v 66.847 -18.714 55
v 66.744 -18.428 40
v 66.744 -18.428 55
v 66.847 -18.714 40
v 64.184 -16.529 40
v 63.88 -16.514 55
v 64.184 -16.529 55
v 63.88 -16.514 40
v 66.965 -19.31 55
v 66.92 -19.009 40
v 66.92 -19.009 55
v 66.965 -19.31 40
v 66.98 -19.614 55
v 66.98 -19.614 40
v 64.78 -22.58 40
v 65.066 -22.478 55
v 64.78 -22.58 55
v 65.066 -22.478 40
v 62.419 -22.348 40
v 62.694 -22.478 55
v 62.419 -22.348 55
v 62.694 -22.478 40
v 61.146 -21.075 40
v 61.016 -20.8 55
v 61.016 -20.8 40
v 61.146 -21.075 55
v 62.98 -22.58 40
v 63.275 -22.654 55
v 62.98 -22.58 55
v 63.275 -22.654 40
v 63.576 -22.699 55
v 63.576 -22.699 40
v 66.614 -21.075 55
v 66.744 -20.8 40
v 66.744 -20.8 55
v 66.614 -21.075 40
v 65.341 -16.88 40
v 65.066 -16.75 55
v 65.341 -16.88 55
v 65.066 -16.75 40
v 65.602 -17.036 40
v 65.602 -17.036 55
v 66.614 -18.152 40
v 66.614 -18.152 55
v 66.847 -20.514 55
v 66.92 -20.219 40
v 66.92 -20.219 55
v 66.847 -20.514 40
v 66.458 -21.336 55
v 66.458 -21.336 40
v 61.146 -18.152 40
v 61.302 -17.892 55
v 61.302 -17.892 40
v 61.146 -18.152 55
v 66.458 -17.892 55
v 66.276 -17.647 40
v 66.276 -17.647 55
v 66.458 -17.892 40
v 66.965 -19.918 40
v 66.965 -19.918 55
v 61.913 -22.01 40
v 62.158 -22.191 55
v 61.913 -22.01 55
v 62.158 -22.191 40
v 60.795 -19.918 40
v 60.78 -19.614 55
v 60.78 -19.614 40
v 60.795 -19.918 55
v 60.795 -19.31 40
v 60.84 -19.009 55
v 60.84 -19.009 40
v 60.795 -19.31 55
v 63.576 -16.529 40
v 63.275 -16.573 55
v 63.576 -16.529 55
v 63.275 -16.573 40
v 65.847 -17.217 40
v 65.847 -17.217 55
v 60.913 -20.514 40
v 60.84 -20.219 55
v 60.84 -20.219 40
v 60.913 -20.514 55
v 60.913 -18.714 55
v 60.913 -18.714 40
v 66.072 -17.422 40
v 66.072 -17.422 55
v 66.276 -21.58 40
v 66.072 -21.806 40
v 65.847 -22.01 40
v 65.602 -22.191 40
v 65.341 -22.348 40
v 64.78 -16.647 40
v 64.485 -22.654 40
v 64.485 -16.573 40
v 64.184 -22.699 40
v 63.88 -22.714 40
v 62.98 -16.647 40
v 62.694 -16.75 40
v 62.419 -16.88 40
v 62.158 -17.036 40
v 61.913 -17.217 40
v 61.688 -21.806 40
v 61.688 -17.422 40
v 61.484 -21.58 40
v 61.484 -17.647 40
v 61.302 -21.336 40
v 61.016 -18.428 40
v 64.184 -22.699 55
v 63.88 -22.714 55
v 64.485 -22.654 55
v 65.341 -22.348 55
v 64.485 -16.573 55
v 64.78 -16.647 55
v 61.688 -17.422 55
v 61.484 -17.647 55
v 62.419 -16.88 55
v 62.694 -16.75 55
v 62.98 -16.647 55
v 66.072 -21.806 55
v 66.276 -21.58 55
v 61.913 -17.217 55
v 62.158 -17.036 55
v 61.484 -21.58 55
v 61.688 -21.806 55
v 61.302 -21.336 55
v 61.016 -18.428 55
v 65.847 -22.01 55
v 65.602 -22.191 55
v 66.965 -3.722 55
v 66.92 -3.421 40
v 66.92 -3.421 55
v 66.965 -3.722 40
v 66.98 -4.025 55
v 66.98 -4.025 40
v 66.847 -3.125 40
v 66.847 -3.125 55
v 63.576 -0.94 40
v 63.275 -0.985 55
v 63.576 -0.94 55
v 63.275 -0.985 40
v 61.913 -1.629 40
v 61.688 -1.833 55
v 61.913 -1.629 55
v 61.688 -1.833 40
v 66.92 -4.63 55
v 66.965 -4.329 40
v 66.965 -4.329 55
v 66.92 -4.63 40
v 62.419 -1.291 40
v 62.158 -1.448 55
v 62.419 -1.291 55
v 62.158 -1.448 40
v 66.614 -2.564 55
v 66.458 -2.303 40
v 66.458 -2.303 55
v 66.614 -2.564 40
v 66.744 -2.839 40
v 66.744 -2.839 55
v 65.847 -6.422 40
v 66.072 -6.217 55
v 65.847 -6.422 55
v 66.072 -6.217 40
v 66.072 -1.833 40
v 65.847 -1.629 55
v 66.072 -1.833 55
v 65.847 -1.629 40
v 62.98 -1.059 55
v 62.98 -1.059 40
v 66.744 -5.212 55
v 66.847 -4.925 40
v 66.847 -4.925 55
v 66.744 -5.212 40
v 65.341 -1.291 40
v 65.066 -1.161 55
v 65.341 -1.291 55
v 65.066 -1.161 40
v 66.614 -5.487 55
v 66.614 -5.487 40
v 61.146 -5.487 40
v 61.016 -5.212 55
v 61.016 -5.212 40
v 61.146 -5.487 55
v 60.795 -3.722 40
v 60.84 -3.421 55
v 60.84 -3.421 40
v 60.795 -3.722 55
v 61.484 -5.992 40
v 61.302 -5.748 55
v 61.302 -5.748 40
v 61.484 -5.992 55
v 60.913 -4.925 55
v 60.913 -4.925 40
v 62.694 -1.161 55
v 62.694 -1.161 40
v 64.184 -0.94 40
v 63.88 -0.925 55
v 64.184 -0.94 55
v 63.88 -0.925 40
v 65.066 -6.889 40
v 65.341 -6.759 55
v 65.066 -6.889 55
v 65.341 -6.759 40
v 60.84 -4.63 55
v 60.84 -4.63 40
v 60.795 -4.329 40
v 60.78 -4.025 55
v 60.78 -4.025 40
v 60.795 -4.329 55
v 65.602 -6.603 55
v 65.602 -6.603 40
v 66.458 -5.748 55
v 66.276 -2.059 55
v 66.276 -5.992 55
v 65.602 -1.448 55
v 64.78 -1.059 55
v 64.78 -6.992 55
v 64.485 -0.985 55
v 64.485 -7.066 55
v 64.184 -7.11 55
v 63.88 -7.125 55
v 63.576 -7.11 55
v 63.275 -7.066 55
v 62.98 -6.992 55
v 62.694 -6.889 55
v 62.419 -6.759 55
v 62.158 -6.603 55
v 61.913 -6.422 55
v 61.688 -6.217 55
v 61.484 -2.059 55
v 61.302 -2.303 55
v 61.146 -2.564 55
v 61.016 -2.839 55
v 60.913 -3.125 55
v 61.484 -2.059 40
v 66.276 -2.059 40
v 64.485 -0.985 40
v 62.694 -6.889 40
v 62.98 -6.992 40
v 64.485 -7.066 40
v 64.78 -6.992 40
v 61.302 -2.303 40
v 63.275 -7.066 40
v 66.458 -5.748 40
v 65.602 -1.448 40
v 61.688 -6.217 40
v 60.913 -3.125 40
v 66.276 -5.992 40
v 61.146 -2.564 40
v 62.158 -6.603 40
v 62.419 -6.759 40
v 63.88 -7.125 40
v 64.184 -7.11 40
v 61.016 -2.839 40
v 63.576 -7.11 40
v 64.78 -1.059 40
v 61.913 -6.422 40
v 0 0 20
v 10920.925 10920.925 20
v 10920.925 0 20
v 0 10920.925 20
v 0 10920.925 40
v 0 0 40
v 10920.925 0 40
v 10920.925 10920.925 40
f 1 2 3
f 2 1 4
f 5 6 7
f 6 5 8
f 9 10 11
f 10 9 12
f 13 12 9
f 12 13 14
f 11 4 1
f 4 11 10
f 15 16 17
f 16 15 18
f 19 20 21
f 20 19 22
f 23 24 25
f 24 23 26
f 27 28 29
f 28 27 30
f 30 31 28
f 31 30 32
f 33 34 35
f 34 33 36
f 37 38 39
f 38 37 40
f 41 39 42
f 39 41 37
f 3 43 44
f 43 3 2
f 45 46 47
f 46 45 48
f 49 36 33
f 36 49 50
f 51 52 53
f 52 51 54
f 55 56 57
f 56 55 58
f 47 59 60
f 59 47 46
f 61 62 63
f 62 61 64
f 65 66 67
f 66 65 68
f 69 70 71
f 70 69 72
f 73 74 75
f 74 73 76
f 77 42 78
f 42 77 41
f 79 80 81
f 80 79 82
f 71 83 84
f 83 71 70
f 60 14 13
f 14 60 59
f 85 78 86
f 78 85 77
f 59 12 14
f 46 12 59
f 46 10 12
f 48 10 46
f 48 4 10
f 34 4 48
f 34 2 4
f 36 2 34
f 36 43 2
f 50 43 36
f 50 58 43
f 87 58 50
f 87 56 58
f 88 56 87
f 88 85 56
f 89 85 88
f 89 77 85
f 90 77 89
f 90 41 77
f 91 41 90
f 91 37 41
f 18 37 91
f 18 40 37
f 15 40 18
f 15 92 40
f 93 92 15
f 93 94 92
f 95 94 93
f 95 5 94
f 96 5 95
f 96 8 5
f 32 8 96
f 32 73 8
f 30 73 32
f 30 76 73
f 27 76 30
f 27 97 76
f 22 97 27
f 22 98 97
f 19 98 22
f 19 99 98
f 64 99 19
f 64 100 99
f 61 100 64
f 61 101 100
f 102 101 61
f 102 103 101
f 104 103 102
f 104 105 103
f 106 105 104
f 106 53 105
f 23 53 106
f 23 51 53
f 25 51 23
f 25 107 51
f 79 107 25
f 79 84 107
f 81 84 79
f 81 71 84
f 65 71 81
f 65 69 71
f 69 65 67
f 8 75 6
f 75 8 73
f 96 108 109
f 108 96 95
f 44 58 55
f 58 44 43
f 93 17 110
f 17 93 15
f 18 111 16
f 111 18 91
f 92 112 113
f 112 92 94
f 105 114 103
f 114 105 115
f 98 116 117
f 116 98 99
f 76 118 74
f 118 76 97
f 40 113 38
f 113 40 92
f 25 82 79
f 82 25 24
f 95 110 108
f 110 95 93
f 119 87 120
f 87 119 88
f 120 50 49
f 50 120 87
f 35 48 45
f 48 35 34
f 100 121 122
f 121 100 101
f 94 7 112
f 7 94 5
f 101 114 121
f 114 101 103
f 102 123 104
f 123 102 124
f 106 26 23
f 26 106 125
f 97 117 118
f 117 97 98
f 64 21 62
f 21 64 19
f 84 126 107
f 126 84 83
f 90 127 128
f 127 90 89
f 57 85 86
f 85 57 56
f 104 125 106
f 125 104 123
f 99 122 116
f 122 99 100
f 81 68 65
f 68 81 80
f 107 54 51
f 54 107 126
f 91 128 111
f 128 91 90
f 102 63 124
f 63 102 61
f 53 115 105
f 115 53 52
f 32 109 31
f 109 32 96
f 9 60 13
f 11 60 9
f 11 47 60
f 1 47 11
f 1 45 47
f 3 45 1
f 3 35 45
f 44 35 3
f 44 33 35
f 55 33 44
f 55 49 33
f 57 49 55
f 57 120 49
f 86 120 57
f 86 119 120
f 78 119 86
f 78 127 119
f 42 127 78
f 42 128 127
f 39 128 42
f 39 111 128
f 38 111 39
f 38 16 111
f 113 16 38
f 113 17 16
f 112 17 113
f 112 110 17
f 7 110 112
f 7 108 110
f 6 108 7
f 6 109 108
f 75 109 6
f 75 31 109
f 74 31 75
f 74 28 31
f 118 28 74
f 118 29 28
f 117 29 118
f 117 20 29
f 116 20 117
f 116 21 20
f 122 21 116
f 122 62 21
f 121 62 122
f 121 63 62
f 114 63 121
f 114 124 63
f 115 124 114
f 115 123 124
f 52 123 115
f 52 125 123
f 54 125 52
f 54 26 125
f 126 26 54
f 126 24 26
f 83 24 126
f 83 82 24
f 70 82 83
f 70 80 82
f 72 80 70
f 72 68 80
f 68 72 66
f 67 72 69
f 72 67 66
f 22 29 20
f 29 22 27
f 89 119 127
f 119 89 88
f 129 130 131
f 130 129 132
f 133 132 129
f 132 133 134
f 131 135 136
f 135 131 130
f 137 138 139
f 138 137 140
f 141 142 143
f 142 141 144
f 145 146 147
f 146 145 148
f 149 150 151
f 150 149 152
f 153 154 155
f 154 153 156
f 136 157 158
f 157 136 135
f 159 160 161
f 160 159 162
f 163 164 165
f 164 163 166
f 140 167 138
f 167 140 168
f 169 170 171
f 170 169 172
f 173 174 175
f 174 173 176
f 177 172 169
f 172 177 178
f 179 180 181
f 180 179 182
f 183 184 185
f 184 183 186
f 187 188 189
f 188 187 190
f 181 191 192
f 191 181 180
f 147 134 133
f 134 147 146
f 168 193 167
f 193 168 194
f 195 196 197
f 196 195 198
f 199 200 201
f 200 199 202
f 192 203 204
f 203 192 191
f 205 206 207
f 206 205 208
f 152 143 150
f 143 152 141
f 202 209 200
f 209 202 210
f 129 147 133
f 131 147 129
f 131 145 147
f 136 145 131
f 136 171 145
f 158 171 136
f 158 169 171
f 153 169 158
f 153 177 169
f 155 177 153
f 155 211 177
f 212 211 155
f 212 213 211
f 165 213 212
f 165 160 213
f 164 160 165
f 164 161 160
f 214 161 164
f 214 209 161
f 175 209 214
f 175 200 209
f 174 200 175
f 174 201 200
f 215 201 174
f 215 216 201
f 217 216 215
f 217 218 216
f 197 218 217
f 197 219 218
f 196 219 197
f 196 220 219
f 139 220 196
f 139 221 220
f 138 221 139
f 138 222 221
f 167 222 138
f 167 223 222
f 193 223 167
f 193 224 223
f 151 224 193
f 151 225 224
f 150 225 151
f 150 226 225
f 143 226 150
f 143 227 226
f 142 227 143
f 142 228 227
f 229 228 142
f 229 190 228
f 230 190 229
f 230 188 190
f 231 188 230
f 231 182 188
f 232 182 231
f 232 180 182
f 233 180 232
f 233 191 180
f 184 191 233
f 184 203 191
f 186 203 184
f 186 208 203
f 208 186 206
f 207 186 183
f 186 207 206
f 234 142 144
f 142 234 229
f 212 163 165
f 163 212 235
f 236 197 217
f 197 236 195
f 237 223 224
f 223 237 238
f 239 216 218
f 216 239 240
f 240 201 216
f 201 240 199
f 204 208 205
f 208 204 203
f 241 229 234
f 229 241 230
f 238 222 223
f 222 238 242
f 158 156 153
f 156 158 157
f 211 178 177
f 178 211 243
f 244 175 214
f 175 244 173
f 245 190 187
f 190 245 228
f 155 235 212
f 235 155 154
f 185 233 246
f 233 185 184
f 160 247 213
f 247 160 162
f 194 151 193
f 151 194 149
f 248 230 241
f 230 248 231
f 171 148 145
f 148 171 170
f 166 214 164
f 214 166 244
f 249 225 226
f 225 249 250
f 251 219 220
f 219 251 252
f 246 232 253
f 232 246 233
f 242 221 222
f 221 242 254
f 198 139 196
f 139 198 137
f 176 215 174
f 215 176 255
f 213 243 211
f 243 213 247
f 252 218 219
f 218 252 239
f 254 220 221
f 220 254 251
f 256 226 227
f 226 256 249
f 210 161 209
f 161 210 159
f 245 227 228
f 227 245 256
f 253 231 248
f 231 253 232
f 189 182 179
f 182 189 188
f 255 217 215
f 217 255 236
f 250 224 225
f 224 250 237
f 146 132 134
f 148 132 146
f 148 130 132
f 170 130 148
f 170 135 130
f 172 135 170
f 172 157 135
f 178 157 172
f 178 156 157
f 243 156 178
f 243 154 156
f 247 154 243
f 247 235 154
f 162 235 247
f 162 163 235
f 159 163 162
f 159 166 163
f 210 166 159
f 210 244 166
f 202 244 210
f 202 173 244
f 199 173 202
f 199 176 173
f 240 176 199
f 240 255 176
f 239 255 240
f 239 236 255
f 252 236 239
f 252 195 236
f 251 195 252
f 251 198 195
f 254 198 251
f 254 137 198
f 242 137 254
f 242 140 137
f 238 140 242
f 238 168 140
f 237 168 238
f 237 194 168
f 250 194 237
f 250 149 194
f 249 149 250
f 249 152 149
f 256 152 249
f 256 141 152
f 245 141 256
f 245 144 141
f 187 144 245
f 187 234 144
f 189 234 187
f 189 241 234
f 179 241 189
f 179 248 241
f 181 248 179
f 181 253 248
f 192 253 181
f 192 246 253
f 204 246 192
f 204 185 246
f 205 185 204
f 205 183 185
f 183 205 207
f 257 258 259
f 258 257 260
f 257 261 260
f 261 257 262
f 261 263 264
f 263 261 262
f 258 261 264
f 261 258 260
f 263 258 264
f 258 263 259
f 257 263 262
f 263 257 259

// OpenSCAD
// Dimensions in mm
X = 127.76;
Y = 85.48;
Z = 20;

// Hole dimensions and grid parameters
hole_diameter = 6.2;
hole_spacing_x = 9.0;
hole_spacing_y = hole_spacing_x * sqrt(3);
num_rows = 8;
num_cols = 12;
first_hole_x = (X - num_cols * hole_spacing_x) / 2;
first_hole_y = (Y - num_rows * hole_spacing_y) / 2;

// Chamfer dimensions
chamfer_leg_length = 5.0;
chamfer_angle = 45;

// Build the rack
translate([0, 0, Z]) {
    // Top and bottom plates
    linear_extrude(Z) {
        square(X * Y);
    }
    
    // Vertical edges with chamfers
    for (y = [0, hole_spacing_y]) {
        translate([first_hole_x + num_cols * hole_spacing_x / 2, first_hole_y + y, Z])
            rotate_extrude(45) {
                linear_extrude(Z - chamfer_leg_length)
                    square(chamfer_leg_length);
            }
    }

    // Vertical through-holes
    for (y = [0, hole_spacing_y]) {
        translate([first_hole_x + num_cols * hole_spacing_x / 2, first_hole_y + y, Z])
            cylinder(h = Z - chamfer_leg_length, r = hole_diameter / 2, $fn = 64);
    }

    // Orientation mark at A1 corner
    translate([first_hole_x + num_cols * hole_spacing_x / 2 - chamfer_leg_length / 2, first_hole_y + num_rows * hole_spacing_y / 2, Z])
        rotate_extrude(45) {
            linear_extrude(Z - chamfer_leg_length)
                square(chamfer_leg_length);
        }
}

// Add a small gap at the top to match the original height of 20mm
translate([0, 0, Z + 1e-6])
    linear_extrude(1e-6) {
        square(X * Y);
    }
